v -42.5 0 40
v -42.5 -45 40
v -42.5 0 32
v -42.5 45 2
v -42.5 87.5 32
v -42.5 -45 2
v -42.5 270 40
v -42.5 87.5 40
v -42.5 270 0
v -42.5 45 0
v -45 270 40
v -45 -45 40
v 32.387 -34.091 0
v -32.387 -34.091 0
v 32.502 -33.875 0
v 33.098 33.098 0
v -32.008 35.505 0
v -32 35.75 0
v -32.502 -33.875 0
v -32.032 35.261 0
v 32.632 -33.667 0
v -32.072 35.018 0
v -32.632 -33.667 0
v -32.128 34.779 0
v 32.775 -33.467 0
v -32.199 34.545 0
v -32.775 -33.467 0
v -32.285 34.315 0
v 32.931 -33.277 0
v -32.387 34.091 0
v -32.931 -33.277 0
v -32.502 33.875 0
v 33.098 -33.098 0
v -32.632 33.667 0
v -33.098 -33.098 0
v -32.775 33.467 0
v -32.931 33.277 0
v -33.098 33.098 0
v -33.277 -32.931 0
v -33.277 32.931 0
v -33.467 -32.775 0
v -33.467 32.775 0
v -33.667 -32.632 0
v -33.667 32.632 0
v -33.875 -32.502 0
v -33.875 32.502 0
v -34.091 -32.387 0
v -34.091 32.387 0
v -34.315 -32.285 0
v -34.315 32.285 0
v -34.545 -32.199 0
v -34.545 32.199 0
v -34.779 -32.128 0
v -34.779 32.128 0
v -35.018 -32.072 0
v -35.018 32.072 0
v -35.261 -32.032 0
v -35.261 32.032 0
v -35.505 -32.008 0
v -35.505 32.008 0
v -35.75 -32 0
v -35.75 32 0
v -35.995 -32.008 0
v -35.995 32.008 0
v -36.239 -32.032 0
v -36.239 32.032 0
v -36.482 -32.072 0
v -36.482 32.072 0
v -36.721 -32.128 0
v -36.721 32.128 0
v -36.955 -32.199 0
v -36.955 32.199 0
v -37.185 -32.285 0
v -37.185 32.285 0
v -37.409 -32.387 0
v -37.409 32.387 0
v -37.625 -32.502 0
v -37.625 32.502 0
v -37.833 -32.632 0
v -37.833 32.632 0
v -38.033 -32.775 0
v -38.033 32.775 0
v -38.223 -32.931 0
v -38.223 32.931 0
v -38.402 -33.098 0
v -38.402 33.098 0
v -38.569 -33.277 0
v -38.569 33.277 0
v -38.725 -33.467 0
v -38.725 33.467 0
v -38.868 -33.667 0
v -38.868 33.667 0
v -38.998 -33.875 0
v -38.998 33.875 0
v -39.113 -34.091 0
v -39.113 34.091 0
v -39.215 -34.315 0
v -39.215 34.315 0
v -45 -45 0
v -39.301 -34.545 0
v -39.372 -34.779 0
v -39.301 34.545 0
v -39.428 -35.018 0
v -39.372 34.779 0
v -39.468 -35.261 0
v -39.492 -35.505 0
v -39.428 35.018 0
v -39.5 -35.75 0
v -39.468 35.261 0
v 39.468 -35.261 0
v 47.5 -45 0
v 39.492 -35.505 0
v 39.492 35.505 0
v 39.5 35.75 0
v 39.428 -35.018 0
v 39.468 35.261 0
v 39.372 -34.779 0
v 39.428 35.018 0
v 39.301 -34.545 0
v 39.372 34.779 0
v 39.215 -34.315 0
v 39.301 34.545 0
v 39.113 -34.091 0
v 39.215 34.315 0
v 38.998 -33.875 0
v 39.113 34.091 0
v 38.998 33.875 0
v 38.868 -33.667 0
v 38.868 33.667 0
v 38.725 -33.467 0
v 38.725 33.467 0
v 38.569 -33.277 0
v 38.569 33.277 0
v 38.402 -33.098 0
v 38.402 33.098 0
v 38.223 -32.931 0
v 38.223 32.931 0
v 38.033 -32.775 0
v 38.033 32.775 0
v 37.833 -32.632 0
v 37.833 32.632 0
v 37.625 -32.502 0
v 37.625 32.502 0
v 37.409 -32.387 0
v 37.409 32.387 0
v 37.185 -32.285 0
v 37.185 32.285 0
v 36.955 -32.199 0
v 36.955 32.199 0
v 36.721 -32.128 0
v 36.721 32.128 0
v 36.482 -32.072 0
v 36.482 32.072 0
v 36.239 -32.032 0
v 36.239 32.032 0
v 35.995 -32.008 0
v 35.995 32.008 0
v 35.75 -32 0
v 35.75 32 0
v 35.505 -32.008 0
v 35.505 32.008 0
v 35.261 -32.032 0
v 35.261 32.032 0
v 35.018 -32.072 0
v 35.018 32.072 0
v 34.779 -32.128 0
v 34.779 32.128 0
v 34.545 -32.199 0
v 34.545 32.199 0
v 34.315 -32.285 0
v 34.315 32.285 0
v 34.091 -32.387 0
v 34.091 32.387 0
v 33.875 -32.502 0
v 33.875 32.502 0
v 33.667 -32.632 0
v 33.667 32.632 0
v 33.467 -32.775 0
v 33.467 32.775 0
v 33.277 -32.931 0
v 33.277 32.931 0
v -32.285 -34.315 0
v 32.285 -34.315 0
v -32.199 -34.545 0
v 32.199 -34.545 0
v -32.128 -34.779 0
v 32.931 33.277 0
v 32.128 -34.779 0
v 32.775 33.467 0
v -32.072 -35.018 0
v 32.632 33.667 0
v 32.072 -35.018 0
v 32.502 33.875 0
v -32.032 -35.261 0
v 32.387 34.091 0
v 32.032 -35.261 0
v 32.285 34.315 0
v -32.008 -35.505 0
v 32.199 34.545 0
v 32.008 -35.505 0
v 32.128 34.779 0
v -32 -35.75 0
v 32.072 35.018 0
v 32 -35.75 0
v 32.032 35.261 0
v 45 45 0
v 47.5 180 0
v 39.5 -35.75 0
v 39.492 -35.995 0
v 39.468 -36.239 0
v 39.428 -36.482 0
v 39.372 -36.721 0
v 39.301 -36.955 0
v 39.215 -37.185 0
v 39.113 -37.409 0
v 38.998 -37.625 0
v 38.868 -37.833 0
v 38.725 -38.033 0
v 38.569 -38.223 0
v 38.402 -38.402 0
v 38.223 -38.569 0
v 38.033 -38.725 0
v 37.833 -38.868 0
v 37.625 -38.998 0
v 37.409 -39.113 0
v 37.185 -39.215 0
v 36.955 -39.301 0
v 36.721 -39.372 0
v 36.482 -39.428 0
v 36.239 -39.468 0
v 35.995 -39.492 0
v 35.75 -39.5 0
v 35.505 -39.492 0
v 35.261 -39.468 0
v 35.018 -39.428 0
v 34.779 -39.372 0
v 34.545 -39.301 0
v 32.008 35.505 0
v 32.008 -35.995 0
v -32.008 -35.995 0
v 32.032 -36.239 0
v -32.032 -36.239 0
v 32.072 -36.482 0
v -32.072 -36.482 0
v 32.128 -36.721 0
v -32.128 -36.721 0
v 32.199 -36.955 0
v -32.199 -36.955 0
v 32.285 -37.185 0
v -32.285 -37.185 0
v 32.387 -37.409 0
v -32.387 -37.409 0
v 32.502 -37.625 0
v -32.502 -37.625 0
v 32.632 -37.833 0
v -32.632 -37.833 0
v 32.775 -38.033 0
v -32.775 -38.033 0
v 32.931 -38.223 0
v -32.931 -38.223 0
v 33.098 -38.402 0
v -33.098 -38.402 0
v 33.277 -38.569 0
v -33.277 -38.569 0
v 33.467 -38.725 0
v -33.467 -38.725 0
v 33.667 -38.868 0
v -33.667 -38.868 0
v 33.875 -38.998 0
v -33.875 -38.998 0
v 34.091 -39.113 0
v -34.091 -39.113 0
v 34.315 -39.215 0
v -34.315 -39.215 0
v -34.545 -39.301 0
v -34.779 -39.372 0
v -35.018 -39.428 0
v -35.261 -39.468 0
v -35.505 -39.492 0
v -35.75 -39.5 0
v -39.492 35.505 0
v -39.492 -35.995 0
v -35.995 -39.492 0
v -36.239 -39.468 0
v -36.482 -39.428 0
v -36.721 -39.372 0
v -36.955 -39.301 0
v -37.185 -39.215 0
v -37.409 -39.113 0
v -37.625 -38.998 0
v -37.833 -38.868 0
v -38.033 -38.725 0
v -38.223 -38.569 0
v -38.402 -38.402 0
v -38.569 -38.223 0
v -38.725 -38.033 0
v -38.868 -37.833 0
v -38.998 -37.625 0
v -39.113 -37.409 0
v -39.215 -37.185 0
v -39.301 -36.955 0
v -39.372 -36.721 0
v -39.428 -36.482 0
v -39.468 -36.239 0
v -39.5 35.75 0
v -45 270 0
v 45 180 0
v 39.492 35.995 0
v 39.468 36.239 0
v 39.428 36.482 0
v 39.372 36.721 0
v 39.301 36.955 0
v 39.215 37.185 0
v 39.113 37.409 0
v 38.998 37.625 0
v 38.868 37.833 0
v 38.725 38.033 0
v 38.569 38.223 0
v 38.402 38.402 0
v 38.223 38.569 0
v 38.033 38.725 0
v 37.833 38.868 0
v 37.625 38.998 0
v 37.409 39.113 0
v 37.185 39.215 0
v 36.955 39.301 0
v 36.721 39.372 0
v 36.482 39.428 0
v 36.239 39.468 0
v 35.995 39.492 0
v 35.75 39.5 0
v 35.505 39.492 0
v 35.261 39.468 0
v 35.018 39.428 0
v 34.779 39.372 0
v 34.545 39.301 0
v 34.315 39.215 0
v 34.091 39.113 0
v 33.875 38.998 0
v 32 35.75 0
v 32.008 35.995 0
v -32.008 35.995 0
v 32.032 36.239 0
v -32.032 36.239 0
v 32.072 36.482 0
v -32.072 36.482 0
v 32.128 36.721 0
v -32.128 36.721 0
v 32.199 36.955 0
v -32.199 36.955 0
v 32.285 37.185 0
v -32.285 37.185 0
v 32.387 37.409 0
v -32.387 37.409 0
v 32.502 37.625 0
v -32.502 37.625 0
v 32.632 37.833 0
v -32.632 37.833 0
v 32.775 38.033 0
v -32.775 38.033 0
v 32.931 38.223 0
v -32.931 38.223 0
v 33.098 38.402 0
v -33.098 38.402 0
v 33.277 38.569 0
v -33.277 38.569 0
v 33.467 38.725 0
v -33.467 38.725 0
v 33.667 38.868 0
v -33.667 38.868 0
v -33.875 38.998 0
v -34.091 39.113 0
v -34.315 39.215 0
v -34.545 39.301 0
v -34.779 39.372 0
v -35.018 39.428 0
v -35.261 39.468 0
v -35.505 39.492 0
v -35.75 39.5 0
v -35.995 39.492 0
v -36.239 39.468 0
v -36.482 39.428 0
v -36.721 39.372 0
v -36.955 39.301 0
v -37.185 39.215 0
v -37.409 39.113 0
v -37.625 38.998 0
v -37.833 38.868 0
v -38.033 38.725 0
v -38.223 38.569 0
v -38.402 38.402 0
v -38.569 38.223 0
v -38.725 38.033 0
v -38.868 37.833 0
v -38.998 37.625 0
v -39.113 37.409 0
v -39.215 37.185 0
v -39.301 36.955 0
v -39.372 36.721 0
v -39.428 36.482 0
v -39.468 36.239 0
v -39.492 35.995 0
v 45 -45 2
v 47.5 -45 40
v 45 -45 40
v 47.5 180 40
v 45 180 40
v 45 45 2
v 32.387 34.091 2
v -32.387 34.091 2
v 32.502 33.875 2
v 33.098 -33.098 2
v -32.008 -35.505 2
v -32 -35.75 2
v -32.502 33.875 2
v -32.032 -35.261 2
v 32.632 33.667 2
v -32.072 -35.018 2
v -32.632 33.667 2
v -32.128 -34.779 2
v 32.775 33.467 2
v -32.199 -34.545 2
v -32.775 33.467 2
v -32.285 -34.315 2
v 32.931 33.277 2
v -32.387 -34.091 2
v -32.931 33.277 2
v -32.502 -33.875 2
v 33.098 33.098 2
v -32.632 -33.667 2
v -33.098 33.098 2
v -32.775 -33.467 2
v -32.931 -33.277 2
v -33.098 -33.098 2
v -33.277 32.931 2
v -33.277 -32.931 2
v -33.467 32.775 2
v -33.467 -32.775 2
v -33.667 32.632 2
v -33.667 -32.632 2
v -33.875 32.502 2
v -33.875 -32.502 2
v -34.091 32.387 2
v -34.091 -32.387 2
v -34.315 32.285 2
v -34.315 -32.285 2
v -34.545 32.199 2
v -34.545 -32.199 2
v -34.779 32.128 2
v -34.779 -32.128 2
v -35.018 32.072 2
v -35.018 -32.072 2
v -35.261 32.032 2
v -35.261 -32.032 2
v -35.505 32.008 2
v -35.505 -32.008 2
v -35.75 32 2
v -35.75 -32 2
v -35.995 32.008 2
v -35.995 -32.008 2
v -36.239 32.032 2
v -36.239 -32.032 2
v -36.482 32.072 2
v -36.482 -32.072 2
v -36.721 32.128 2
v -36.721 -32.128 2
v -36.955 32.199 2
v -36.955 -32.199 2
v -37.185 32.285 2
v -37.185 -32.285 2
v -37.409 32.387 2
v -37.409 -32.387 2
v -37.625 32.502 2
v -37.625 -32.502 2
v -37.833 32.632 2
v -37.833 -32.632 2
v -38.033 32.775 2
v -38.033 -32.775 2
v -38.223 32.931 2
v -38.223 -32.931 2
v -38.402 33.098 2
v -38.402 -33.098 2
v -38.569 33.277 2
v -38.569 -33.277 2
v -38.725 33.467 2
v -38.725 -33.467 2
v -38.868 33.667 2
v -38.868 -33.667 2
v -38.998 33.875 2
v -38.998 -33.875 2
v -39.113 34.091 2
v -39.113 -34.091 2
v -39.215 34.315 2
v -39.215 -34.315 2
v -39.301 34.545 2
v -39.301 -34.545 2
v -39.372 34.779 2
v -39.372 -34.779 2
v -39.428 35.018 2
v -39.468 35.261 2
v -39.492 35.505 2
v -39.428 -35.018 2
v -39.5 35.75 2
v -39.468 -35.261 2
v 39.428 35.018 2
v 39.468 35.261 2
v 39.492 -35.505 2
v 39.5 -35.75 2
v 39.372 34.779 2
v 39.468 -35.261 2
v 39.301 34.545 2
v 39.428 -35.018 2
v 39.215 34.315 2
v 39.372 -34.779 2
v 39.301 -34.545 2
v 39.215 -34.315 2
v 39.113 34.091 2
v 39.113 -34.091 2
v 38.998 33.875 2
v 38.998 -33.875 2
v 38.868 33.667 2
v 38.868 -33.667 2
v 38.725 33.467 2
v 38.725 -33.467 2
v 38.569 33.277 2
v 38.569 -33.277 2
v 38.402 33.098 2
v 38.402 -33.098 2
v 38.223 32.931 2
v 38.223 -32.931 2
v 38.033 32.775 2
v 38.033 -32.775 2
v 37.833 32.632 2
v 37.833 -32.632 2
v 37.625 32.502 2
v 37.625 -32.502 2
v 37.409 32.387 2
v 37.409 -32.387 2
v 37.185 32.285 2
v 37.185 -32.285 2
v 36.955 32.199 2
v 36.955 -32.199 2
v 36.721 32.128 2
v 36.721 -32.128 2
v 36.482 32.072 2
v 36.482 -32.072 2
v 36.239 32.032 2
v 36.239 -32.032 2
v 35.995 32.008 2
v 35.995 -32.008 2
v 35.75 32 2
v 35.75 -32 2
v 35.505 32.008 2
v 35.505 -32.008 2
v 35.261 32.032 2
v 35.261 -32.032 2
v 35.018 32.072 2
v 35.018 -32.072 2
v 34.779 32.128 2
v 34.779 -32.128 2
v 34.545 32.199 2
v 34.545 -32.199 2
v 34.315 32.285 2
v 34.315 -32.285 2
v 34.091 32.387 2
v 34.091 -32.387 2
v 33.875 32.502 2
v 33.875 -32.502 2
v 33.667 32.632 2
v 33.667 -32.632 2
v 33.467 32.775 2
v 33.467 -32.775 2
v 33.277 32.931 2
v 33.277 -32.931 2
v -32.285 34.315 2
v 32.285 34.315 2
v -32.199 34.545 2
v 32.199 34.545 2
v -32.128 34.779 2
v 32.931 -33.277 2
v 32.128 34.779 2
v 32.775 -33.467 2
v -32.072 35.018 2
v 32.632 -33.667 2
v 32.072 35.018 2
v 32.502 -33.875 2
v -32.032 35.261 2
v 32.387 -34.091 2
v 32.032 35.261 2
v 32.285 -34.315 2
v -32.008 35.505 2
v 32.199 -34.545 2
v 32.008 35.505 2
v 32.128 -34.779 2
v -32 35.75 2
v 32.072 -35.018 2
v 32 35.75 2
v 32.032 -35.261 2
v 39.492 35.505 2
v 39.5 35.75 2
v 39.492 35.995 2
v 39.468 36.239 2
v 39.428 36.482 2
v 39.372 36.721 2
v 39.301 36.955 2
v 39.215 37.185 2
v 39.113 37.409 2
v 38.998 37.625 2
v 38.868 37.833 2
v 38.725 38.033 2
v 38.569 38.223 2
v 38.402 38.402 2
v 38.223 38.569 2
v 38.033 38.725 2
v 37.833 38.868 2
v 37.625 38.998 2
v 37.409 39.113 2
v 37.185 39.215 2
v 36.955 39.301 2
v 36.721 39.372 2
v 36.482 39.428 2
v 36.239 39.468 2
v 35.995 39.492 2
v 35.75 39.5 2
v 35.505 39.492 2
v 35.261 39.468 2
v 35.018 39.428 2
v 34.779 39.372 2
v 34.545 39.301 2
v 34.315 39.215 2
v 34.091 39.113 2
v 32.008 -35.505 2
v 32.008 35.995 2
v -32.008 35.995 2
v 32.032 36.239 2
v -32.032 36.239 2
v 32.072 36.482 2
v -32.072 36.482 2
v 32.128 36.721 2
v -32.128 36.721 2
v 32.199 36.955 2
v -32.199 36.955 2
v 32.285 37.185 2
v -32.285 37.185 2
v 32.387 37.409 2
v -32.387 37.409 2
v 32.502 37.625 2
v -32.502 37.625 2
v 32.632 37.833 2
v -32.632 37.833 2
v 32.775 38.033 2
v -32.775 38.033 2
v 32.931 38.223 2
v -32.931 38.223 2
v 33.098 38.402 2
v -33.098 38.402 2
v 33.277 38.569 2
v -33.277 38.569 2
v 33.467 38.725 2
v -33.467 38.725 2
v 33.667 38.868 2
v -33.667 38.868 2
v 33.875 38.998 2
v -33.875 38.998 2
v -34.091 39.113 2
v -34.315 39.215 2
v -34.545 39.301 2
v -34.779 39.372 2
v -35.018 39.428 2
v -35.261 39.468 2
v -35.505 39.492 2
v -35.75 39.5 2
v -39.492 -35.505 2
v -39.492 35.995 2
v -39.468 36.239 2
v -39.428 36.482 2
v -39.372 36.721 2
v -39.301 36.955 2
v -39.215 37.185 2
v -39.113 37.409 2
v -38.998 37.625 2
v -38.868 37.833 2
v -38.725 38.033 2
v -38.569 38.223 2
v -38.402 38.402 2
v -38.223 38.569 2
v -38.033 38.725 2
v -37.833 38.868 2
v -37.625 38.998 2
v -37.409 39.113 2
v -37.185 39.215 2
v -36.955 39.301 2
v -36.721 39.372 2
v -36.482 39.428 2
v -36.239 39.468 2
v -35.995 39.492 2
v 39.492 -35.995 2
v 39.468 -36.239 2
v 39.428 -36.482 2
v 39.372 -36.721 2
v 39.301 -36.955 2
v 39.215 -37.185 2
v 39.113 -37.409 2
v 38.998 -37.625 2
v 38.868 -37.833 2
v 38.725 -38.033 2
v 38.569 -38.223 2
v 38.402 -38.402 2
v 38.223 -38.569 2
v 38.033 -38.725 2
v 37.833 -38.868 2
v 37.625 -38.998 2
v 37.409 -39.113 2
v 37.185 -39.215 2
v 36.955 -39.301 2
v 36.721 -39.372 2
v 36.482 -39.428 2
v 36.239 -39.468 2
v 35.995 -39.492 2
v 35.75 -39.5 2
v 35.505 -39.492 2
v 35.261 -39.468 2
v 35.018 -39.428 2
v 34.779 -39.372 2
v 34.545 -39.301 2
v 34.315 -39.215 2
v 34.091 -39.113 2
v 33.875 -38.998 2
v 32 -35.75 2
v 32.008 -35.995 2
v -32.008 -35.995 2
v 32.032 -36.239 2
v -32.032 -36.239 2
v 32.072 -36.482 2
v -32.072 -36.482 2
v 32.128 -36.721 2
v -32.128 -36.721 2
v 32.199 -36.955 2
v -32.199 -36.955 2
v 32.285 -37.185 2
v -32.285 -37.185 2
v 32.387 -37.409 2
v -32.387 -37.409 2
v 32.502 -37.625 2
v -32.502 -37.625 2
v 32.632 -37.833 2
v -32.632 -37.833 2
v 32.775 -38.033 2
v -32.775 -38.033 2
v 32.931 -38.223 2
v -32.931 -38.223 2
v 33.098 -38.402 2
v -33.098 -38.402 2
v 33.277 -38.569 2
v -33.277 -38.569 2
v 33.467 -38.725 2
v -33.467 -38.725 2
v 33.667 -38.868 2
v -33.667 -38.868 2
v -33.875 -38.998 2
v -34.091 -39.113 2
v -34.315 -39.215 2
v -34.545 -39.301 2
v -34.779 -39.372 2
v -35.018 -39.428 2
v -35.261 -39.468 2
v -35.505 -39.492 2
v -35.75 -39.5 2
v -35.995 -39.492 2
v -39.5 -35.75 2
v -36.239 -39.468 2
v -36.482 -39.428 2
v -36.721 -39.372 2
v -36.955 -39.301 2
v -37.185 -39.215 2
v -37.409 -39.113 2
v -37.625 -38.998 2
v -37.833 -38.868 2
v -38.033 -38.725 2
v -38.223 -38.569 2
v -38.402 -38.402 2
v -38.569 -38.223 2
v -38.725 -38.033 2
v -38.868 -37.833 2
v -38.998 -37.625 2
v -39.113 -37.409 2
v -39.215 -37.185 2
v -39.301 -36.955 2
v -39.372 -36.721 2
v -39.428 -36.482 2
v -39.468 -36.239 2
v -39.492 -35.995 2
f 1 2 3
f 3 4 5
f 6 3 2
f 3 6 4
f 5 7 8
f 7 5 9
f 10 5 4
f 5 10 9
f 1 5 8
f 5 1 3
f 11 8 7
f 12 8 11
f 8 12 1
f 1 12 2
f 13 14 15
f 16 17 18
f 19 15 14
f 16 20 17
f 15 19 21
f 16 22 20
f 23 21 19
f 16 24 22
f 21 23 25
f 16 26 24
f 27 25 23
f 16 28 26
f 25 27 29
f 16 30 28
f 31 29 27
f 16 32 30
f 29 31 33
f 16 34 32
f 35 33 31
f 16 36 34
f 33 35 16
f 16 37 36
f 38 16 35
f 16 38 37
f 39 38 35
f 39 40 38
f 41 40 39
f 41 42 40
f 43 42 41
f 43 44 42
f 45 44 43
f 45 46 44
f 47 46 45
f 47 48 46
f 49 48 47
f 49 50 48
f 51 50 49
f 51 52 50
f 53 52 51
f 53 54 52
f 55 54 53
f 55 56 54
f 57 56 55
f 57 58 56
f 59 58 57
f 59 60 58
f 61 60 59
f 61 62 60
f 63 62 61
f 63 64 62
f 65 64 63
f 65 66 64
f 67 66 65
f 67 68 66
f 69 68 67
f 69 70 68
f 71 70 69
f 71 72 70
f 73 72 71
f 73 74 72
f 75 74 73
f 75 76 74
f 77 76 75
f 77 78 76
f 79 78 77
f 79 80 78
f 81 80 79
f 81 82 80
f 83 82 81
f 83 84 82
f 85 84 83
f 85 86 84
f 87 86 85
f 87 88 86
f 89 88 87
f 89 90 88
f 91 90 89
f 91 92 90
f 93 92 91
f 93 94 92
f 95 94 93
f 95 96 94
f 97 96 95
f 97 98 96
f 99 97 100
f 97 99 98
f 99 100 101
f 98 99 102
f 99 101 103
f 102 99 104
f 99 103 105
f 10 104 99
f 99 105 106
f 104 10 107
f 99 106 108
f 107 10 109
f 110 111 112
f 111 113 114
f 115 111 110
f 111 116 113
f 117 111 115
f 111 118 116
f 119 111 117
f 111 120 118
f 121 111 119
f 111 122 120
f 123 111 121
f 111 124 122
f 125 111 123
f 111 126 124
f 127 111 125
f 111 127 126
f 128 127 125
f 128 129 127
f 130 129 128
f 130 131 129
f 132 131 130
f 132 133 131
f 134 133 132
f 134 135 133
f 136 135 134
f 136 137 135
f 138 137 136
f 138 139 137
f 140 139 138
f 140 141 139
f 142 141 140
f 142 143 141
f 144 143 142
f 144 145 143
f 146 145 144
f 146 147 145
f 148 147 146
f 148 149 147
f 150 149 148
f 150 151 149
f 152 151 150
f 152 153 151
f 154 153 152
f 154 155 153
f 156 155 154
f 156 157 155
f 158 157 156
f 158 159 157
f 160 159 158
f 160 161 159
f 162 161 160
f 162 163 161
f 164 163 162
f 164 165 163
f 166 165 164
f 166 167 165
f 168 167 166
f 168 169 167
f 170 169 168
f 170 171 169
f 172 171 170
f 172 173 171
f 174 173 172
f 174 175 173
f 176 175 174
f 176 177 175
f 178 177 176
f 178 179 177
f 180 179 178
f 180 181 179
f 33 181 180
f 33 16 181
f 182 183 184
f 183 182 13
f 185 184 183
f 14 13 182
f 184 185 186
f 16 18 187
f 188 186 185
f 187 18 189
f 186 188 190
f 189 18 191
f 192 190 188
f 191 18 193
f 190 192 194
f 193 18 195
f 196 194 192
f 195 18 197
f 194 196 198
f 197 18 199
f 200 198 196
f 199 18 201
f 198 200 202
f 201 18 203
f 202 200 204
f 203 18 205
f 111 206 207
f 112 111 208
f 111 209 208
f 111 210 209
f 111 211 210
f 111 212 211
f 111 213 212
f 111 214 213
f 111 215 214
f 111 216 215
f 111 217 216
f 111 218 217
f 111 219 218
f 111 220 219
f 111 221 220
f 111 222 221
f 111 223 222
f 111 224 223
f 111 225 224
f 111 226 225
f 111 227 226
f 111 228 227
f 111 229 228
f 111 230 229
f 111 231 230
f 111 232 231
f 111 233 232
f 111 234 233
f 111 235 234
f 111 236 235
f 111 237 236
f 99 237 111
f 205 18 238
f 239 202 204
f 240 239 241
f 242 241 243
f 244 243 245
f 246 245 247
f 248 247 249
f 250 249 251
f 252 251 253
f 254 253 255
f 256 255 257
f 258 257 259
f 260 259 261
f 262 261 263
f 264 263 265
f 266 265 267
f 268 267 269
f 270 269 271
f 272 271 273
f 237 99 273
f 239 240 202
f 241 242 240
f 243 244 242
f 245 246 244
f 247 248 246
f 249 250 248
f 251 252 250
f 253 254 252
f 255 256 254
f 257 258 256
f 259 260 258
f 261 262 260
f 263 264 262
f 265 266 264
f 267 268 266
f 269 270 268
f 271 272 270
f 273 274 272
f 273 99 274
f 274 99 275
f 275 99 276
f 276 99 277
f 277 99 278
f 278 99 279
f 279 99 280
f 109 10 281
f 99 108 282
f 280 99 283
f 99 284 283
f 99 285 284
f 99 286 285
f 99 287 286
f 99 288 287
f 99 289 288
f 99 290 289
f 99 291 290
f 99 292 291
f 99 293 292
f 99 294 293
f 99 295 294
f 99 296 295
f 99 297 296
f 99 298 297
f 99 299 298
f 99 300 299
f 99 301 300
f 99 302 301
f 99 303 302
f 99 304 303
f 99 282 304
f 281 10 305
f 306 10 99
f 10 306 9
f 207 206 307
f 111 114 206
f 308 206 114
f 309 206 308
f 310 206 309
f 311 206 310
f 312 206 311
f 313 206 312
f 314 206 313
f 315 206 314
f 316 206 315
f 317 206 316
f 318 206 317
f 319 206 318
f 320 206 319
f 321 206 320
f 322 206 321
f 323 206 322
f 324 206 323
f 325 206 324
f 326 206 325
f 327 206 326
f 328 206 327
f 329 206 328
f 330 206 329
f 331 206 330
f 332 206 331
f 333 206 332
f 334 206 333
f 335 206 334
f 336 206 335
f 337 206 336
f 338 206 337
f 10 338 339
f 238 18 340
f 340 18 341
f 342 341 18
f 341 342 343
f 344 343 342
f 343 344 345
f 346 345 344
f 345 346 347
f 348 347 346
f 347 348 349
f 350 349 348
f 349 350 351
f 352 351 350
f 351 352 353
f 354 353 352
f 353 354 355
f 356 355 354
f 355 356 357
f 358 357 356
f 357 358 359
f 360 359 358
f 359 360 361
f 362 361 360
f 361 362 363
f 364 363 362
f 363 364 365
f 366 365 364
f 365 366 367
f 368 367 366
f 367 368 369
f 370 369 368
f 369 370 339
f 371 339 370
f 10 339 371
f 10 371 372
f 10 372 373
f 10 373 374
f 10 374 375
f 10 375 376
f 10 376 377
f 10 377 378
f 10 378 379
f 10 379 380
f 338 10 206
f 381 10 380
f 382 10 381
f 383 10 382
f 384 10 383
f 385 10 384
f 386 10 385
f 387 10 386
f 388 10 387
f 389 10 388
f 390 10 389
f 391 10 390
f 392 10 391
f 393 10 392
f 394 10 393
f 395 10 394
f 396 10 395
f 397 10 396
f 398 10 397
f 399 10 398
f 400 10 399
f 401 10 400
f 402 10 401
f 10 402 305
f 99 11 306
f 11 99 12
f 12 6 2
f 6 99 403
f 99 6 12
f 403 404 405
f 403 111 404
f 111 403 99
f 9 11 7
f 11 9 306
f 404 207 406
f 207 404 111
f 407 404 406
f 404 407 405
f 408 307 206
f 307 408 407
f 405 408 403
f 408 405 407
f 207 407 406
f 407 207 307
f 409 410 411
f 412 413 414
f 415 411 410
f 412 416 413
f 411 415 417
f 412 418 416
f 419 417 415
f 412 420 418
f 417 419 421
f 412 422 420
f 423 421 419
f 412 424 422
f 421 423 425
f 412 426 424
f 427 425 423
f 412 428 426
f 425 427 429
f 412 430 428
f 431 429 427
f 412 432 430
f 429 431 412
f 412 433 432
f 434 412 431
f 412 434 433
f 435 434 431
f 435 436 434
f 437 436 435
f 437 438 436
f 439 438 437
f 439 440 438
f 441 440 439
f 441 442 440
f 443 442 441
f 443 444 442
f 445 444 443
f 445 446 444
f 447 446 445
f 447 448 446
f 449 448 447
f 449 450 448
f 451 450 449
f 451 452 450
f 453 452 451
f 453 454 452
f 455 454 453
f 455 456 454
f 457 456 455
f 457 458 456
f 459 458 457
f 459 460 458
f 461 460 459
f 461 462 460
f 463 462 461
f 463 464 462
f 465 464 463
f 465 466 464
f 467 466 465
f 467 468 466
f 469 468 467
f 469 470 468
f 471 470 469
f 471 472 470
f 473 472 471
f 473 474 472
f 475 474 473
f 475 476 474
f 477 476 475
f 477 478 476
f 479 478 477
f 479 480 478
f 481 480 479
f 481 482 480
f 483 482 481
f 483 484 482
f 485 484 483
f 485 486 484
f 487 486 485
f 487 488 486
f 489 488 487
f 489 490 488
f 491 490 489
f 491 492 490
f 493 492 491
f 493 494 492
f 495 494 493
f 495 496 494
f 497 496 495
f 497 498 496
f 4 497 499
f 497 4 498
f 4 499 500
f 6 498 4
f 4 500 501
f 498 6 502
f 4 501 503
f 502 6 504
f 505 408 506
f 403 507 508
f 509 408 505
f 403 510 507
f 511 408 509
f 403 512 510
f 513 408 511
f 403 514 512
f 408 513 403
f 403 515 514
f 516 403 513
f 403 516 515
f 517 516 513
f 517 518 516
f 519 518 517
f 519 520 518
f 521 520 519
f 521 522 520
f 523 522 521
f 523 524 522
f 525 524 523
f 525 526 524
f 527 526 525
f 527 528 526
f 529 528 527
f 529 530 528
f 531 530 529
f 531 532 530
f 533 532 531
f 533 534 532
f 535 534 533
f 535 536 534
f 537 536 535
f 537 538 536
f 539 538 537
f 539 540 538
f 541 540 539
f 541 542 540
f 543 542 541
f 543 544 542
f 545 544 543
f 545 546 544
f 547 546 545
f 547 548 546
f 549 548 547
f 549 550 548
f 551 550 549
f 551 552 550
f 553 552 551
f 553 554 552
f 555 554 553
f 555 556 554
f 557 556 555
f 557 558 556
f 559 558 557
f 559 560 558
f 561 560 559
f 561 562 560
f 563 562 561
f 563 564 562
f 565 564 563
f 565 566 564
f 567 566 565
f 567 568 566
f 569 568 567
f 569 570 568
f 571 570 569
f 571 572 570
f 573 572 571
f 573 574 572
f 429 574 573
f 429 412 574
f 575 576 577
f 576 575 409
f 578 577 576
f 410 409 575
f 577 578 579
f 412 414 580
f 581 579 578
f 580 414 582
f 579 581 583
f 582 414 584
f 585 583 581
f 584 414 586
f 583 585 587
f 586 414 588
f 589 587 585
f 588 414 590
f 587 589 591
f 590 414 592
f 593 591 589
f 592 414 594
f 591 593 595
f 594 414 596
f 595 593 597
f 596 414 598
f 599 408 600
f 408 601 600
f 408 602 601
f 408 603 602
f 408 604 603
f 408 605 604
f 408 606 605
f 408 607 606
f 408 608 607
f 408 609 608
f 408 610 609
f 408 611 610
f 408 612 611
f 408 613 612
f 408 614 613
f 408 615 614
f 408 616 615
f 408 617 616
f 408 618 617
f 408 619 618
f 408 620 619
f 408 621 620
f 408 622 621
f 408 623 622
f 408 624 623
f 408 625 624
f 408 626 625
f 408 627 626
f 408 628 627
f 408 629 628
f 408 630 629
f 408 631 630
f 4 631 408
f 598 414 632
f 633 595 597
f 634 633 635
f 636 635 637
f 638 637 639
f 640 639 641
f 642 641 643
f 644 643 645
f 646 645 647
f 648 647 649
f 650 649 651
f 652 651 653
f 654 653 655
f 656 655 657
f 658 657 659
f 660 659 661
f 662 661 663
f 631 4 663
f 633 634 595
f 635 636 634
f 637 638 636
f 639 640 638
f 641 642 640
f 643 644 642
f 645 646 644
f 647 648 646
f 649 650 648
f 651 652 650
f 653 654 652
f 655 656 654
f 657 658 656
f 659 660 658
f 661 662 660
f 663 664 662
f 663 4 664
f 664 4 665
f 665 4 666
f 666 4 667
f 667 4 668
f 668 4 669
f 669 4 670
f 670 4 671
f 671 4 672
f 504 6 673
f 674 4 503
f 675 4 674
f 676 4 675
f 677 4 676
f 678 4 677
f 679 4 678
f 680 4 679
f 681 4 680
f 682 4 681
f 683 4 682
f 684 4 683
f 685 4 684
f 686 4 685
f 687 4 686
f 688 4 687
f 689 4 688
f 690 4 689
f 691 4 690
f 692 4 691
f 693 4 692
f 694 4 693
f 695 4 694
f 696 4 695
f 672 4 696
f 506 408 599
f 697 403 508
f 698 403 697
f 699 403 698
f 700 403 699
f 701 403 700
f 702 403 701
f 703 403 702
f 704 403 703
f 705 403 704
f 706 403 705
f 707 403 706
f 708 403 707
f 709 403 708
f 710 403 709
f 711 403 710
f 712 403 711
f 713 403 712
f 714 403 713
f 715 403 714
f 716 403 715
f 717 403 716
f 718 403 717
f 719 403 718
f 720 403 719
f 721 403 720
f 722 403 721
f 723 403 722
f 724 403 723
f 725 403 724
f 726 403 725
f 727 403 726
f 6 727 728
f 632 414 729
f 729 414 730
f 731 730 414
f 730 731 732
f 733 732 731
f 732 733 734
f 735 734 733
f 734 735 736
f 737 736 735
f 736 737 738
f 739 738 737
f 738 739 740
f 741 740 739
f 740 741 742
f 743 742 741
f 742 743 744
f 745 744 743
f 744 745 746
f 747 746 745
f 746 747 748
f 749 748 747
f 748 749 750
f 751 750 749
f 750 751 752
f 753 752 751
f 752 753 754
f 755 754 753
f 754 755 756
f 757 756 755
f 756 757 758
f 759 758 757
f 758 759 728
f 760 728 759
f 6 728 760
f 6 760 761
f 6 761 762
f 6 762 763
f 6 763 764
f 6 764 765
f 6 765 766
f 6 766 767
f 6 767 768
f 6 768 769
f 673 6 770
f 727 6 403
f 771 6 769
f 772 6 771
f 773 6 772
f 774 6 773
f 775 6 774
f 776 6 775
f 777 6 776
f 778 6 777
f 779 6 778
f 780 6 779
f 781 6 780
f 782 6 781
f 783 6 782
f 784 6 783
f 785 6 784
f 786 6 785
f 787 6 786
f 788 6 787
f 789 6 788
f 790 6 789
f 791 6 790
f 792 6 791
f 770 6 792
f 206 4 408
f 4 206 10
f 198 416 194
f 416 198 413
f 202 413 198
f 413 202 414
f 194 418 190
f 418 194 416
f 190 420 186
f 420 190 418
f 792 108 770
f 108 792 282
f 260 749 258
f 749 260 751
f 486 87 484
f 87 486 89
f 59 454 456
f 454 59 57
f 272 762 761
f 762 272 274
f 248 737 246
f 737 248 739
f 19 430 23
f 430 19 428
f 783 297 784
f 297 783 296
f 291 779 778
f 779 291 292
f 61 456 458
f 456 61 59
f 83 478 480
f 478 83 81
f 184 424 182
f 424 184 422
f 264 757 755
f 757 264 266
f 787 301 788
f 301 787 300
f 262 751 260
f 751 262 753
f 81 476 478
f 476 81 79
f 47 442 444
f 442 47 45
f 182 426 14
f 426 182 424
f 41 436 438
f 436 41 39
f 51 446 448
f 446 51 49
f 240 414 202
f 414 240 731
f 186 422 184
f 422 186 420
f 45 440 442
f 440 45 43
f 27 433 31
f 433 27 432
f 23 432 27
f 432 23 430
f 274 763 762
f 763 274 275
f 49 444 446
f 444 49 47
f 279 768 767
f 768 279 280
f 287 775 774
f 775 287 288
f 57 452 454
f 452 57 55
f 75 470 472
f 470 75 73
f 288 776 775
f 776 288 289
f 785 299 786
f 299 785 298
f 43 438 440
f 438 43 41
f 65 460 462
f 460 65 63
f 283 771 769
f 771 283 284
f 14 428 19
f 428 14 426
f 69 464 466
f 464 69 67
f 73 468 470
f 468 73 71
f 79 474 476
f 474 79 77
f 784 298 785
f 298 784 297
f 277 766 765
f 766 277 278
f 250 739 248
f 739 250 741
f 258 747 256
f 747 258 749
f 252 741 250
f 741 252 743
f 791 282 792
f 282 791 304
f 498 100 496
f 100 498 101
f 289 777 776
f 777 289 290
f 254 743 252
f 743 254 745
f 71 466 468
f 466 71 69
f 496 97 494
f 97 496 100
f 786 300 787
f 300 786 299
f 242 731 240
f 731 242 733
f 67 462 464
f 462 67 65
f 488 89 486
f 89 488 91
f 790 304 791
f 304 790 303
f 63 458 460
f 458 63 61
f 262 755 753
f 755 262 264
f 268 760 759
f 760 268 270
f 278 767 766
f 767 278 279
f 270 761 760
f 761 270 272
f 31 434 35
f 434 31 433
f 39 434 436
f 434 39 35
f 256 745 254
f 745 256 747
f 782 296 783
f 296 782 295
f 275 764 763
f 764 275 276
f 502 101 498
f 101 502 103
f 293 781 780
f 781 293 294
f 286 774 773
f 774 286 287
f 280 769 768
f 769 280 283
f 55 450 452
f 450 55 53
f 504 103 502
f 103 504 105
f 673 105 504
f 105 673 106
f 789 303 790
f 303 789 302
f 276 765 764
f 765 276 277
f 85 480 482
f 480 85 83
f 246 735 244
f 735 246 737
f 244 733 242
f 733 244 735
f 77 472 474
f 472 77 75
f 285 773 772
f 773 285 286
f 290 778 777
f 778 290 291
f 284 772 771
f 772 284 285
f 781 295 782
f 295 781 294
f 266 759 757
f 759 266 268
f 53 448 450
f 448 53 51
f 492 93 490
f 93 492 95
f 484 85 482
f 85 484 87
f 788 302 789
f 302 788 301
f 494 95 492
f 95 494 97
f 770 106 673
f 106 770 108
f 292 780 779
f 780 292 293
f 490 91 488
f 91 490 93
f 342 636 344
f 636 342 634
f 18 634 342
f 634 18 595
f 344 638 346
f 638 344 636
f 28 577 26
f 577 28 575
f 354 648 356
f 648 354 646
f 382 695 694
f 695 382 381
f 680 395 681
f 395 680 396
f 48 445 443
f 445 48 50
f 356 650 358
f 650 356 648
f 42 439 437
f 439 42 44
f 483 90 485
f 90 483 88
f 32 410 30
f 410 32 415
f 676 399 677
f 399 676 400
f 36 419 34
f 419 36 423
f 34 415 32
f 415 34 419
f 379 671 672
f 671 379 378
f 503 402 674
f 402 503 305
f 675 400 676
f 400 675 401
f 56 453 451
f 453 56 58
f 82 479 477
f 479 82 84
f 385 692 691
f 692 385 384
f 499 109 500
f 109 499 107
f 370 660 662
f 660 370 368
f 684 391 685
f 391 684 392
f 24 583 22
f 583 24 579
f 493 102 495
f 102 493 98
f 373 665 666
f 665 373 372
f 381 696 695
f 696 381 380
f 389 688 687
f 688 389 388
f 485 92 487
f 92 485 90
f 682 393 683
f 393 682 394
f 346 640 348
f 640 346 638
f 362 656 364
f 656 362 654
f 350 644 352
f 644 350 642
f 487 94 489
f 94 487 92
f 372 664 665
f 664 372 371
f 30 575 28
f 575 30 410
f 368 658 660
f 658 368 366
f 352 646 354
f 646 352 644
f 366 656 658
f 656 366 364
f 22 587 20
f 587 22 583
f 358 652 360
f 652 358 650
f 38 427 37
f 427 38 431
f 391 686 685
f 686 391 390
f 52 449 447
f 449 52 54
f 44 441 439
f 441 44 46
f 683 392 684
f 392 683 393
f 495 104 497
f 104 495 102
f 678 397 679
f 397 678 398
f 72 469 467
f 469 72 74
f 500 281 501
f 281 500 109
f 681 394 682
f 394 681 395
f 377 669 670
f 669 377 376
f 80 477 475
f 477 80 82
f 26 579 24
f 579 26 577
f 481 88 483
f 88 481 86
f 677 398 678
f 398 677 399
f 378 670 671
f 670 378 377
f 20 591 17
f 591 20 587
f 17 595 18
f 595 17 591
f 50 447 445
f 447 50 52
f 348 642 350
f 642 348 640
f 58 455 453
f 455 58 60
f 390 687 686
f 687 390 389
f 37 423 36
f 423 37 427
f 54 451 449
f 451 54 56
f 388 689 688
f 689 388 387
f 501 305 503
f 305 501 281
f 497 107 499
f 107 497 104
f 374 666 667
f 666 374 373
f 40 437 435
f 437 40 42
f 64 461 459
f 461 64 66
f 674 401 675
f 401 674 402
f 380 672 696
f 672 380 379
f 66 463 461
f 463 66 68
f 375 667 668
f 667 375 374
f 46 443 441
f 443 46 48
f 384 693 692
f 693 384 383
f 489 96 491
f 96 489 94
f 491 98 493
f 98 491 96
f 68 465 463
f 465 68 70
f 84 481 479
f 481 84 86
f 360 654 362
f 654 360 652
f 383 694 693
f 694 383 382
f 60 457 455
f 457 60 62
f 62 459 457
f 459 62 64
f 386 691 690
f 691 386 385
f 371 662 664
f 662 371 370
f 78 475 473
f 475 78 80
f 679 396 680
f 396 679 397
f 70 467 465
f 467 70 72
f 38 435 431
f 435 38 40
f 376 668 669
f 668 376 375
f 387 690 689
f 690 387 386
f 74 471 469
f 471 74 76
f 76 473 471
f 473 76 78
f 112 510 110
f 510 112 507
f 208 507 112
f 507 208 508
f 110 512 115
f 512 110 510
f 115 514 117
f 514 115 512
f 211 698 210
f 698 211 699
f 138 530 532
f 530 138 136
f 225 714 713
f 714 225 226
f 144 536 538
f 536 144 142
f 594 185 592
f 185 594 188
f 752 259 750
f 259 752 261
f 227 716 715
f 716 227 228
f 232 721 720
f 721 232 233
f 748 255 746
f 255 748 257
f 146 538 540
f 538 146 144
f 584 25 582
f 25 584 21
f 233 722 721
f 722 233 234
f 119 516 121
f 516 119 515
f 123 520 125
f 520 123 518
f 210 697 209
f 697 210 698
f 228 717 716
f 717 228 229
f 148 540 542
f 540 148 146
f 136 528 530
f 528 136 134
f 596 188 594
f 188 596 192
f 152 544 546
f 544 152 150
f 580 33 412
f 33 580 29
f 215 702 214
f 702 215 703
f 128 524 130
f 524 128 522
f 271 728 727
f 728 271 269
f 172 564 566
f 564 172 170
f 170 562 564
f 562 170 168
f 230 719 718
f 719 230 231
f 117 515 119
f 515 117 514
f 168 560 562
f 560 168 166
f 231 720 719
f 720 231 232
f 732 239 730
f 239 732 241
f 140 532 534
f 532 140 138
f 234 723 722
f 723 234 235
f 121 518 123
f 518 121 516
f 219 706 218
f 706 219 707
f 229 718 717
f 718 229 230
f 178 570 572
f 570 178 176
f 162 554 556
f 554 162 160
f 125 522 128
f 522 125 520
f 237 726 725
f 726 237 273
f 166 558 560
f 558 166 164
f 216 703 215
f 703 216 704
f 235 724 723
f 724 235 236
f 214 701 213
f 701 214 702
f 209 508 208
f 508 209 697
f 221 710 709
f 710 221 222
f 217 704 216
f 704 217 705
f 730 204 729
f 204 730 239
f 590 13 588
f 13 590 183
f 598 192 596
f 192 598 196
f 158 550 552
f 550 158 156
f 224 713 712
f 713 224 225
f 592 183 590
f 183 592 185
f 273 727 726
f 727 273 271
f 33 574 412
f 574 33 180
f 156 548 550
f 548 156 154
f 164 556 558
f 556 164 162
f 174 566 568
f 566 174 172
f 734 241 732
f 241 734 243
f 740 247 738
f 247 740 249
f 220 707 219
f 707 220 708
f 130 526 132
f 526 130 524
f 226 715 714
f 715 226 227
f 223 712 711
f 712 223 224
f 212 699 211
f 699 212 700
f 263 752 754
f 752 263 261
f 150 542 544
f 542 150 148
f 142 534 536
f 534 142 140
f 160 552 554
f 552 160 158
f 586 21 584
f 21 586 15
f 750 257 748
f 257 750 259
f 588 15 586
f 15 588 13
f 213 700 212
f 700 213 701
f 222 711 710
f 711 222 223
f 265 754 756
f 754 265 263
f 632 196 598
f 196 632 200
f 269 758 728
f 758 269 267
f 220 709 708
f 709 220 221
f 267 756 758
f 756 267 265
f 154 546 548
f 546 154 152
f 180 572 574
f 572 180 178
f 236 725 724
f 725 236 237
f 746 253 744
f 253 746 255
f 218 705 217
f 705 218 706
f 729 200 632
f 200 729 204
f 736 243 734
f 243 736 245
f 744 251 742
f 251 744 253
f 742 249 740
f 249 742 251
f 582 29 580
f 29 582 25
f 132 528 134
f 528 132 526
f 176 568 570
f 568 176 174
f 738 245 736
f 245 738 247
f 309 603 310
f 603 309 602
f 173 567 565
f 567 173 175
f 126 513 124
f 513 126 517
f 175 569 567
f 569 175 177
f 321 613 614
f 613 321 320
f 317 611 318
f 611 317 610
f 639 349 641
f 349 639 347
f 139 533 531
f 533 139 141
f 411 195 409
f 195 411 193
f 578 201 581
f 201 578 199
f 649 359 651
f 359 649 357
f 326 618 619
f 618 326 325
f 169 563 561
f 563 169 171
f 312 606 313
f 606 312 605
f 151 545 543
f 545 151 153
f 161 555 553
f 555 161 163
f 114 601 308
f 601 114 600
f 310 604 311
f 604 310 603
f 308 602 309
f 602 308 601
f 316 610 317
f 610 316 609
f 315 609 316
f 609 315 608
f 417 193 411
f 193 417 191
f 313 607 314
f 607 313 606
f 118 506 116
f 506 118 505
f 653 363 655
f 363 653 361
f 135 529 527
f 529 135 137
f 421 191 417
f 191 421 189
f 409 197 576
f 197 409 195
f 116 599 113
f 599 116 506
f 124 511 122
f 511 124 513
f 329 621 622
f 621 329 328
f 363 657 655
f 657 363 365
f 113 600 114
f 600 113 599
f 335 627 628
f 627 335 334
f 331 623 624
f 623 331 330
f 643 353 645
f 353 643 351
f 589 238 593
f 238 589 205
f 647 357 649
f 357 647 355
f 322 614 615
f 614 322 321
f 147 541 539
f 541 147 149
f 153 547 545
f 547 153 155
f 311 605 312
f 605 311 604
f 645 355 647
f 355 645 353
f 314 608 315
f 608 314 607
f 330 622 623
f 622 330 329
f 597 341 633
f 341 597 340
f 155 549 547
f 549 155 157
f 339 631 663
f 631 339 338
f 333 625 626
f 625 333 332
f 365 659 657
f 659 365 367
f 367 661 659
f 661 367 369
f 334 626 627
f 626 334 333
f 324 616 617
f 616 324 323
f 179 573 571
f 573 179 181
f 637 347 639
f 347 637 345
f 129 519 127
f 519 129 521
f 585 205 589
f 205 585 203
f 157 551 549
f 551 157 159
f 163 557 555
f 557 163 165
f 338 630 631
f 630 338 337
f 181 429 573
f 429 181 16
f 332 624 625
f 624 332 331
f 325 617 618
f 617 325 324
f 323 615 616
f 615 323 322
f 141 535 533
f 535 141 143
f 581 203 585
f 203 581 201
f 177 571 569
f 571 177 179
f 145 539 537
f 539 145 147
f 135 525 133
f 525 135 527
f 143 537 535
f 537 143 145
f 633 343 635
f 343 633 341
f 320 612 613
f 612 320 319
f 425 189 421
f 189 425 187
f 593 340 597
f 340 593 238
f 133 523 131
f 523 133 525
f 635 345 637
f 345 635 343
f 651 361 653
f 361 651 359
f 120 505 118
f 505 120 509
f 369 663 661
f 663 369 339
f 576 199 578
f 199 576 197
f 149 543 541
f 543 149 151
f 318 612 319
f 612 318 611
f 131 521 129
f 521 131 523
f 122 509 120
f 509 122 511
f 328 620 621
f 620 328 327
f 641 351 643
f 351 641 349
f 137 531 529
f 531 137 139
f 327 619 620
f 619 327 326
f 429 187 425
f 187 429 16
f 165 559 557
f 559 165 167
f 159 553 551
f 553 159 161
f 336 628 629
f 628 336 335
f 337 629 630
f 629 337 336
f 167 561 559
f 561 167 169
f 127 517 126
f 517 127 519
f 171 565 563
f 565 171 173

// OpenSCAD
// DIY magnetic stirrer housing - print orientation (upside down)
// Units: mm. Walls 2.5 mm thick. Open box, closed top = stirring surface.

// ---------- Parameters ----------
fan_d          = 80;     // fan diameter
outer_x        = 90;     // outer size in X
outer_y        = 90;     // outer size in Y
top_t          = 2;      // top plate thickness (z = 0 to 2)
wall_t         = 2.5;    // wall thickness
box_h          = 40;     // total height of box (open at top)
screw_d        = 4.5;    // M4 screw hole diameter
screw_pitch    = 1.5;    // M4 screw pitch (for clearance)
screw_pattern  = 71.5;   // square pitch of screw holes
notch_w        = 12;     // cable notch width
notch_depth    = 8;      // cable notch depth from open edge
eps            = 0.5;    // cutter overshoot past faces

$fn = 96;

// ---------- Model ----------
difference() {
    union() {
        // Top plate (lies on bed in print orientation)
        translate([-outer_x/2, -outer_y/2, 0])
            cube([outer_x, outer_y, top_t]);

        // Four walls rising from the plate to the open top
        for (dx = [-outer_x/2, outer_x/2])
            for (dy = [-outer_y/2, outer_y/2])
                translate([dx, dy, 0])
                    cube([wall_t, outer_y - dy + (dx < 0 ? outer_x - dx + dy : outer_x - dx - dy), box_h]);
    }

    // Four M4 screw holes through the top plate on a centred square pattern
    for (sx = [-screw_pattern/2, screw_pattern/2],
         sy = [-screw_pattern/2, screw_pattern/2])
        translate([sx, sy, -eps])
            cylinder(d = screw_d + 2*screw_pitch, h = top_t + 2*eps);

    // Cable notch in one wall: 12 mm wide, centred along the wall,
    // reaching 8 mm down from the open edge (z = 32 to z = 40)
    translate([-outer_x/2 + wall_t, 0, box_h - notch_depth])
        cube([notch_w, outer_y - wall_t, notch_depth]);
}
